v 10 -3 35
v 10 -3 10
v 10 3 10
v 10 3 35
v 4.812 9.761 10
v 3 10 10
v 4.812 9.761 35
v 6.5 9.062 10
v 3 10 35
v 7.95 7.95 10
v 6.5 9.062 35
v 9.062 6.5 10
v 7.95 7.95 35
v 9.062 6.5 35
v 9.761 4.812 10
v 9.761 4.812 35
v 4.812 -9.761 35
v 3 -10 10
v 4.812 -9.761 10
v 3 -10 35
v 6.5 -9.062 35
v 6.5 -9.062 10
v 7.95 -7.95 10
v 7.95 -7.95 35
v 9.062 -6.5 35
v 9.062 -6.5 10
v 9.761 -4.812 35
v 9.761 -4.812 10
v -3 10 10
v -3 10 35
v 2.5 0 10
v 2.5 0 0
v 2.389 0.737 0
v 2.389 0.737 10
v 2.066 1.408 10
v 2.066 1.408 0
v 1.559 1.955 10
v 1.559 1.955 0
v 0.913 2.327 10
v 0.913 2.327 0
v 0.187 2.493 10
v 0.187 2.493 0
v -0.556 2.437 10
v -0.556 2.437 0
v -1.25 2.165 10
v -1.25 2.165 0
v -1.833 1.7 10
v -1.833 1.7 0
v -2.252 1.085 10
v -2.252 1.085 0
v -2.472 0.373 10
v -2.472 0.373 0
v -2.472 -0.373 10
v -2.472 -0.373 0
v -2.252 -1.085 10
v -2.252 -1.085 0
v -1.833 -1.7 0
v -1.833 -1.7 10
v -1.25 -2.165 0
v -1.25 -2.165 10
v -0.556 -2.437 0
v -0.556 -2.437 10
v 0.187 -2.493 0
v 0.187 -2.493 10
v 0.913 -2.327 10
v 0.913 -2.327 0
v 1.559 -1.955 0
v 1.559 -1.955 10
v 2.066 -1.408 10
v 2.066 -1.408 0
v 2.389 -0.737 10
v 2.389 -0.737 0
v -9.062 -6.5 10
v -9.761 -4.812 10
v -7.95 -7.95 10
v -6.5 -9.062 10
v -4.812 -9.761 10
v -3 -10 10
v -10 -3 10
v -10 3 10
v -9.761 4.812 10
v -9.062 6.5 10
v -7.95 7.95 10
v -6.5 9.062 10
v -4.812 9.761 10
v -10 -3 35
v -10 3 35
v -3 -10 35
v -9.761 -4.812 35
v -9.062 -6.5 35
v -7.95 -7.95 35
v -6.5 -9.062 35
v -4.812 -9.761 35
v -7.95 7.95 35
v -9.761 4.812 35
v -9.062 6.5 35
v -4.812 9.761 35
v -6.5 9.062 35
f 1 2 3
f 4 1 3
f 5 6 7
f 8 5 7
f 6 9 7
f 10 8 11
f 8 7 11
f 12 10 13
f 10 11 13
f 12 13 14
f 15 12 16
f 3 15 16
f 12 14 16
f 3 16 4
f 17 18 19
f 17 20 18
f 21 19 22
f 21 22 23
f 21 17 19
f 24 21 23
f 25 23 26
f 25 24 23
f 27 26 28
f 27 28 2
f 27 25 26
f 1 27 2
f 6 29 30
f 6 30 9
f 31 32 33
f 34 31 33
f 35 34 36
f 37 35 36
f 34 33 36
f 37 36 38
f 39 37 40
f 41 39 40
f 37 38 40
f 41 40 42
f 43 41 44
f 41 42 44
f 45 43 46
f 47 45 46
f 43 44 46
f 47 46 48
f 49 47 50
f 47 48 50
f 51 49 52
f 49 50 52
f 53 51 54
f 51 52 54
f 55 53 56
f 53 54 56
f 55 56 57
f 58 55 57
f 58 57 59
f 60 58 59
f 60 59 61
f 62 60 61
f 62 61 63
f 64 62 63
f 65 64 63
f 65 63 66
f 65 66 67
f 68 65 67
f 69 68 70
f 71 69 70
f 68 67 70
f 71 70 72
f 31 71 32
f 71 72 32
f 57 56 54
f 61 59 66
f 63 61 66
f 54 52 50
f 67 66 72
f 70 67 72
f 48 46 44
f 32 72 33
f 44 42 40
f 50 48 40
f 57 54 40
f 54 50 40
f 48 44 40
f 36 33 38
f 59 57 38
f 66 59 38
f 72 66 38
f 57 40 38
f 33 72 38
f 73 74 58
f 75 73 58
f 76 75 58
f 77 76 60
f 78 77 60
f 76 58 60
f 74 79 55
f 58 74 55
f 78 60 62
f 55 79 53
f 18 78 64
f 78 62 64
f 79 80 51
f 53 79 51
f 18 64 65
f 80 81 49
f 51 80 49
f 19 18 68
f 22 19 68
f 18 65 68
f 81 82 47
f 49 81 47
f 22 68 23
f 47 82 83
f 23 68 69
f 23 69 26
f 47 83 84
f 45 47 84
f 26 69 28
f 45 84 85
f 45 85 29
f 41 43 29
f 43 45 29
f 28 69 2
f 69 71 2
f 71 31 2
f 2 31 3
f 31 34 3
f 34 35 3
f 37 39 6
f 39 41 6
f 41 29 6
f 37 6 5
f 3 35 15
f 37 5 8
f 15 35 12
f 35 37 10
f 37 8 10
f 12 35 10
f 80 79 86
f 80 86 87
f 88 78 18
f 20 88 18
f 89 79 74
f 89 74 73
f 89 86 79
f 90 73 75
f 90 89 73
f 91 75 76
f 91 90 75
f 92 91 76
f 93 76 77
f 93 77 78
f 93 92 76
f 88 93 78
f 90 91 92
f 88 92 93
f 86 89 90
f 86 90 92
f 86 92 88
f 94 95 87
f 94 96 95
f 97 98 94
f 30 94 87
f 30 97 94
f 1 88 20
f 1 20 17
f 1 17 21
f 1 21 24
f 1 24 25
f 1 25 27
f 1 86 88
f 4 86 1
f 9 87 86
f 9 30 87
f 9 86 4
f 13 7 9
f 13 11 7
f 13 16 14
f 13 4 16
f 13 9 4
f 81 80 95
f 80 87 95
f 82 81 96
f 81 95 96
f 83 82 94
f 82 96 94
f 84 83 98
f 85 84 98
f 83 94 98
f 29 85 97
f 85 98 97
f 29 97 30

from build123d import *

# Parameters (mm, degrees)
SKETCH1_R           = 2.5
BOSS_EXTRUDE1_DEPTH = 10
SKETCH2_W           = 20
SKETCH2_H           = 20
BOSS_EXTRUDE2_DEPTH = 25
FILLET1_R           = 7


with BuildPart() as part:
    # Sketch1 → Boss-Extrude1 (new body)
    with BuildSketch(Plane.XY):
        Circle(SKETCH1_R)
    extrude(amount=BOSS_EXTRUDE1_DEPTH)

    # Sketch2 → Boss-Extrude2 (add)
    with BuildSketch(Plane.XY.offset(10)):
        Rectangle(SKETCH2_W, SKETCH2_H)
    extrude(amount=BOSS_EXTRUDE2_DEPTH)

    # Fillet1
    fillet1_edges = [part.edges().sort_by_distance(p)[0] for p in [
        (10, -10, 22.5),
        (10, 10, 22.5),
        (-10, 10, 22.5),
        (-10, -10, 22.5),
    ]]
    fillet(fillet1_edges, radius=FILLET1_R)


solid = part.part
